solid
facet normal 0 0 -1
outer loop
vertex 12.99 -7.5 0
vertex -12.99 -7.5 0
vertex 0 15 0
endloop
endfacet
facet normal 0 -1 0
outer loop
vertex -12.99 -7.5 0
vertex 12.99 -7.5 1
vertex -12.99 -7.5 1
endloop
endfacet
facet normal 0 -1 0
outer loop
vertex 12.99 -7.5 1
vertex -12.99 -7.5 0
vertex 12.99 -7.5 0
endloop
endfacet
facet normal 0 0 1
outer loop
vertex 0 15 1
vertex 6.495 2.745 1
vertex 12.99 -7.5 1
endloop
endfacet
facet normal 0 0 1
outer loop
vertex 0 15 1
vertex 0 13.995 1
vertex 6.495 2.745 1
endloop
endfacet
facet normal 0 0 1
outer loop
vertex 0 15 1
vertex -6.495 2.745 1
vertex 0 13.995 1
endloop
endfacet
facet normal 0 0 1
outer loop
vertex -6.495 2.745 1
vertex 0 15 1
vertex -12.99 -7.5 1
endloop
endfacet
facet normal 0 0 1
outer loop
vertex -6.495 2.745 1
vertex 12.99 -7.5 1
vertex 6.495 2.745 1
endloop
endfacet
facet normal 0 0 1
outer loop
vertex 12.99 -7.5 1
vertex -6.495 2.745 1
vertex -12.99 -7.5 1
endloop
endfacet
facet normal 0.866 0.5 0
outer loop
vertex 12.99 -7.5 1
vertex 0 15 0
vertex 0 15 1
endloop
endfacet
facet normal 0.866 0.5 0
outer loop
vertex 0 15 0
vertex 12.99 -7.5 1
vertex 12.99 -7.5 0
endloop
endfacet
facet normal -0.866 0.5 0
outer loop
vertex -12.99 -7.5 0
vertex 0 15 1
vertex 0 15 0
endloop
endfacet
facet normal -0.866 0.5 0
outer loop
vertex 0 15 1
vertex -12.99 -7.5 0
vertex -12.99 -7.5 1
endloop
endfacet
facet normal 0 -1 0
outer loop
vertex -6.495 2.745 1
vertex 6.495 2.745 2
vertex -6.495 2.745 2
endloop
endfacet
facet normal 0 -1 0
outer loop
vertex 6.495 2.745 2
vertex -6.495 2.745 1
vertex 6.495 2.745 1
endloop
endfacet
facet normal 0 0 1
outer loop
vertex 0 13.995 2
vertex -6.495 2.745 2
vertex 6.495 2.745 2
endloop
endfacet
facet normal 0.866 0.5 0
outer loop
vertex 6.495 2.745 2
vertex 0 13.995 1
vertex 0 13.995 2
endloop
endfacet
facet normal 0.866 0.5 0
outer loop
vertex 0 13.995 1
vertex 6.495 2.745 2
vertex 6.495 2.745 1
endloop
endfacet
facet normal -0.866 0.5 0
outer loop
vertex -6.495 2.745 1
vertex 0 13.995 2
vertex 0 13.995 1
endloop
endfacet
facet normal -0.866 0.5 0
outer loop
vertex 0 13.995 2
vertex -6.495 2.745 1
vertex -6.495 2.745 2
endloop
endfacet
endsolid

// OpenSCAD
use <MCAD/regular_shapes.scad>
thickness = 1.0;
scaler = 1.5;
radius = 15;
small_radius = radius / 2.0;

large_height = (sqrt(3) / 2) * radius;
small_height = (sqrt(3) / 2) * small_radius;
translation_offset = (large_height - small_height);
echo(large_height=large_height);
fn = 128;


module render()
{
  triangle_prism(thickness, radius);
  translate([0, translation_offset, thickness])
  triangle_prism(thickness, small_radius);
}

echo(version=version());

render();
